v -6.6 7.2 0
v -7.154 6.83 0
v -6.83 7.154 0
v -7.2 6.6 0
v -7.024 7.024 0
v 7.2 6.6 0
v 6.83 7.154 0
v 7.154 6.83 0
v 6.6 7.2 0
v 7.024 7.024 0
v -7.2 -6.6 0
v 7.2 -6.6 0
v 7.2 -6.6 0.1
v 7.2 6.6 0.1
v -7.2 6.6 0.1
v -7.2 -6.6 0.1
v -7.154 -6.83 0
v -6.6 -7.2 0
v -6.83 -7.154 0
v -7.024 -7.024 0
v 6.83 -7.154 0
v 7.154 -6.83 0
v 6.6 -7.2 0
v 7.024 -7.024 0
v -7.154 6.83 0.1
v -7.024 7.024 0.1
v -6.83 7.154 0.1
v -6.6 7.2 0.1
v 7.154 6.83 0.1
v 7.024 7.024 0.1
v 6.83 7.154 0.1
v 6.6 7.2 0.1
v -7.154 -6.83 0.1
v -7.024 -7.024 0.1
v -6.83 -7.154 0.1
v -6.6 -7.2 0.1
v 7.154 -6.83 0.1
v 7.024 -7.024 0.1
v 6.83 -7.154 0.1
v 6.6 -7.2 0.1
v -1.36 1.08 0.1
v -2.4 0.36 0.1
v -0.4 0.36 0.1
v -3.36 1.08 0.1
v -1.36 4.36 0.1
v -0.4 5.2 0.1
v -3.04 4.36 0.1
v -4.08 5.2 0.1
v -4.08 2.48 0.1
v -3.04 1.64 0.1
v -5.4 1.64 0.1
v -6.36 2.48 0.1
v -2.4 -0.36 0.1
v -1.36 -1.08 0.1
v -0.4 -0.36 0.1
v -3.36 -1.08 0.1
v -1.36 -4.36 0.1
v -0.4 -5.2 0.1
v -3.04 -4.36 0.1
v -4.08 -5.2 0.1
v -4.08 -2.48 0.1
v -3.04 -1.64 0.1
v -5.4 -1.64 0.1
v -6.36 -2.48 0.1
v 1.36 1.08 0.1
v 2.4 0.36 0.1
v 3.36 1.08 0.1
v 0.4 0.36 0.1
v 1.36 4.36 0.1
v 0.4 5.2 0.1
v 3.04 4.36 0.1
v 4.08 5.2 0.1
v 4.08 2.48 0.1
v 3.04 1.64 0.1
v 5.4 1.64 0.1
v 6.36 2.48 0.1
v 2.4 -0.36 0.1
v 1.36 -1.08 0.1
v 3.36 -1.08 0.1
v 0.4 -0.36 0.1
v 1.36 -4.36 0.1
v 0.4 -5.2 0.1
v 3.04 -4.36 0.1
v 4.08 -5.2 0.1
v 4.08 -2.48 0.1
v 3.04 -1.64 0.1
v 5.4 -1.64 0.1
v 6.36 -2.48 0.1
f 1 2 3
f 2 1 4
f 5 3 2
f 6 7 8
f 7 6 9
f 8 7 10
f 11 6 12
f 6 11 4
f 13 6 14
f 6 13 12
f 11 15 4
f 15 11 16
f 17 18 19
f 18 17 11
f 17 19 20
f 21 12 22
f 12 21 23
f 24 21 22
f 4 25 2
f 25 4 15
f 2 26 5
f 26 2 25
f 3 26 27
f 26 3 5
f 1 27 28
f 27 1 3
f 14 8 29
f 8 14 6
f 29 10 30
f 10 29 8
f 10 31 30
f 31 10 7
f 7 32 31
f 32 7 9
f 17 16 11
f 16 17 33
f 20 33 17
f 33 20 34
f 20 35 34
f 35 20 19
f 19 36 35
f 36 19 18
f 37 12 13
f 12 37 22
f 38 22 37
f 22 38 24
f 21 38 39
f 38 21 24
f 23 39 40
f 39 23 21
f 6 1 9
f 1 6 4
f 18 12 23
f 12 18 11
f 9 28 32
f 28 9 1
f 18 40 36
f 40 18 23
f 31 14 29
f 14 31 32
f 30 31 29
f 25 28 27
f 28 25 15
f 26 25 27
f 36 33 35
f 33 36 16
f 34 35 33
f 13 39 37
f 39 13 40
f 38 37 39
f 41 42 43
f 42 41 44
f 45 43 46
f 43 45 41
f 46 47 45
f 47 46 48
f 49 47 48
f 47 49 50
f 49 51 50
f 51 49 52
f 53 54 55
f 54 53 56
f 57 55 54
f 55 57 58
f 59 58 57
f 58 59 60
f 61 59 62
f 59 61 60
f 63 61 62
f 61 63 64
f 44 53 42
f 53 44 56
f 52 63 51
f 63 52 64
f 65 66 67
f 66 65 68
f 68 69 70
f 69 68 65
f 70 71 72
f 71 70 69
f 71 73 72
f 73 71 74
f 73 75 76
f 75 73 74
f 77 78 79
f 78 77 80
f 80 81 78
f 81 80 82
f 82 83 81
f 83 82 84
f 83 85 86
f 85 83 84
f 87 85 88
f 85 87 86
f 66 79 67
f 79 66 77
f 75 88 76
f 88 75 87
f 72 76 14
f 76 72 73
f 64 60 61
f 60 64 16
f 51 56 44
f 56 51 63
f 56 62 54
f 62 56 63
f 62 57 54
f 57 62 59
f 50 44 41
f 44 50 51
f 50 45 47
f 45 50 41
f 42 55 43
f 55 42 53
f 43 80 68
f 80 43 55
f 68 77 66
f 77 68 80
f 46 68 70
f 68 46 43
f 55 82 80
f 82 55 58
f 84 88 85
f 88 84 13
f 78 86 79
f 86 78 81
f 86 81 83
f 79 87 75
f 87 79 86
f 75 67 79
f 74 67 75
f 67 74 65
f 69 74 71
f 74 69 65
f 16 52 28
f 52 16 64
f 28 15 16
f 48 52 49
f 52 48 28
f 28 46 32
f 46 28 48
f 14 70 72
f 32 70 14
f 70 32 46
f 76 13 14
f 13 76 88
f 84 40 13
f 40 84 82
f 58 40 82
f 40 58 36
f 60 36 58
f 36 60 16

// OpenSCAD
// file: ../p/box3u12.scad
use <../lib.scad>
function ldraw_lib__box3u12() = [
// 0 Box with 3 Parallel Faces without Any Edges
// 0 Name: box3u12.dat
// 0 Author: J.C. Tchang [tchang]
// 0 !LDRAW_ORG Primitive UPDATE 2014-02
// 0 !LICENSE Licensed under CC BY 4.0 : see CAreadme.txt
// 
// 0 BFC CERTIFY CCW
  [0,"BFC","CERTIFY"],
  [0,"BFC","CCW"],
// 
// 0 !HISTORY 2014-12-23 [PTadmin] Official Update 2014-02
// 
// 
// 4 16 -1 1 1 1 1 1 1 1 -1 -1 1 -1
  [4,16,-1,1,1,1,1,1,1,1,-1,-1,1,-1],
// 4 16 -1 1 1 -1 0 1 1 0 1 1 1 1
  [4,16,-1,1,1,-1,0,1,1,0,1,1,1,1],
// 4 16 1 1 -1 1 0 -1 -1 0 -1 -1 1 -1
  [4,16,1,1,-1,1,0,-1,-1,0,-1,-1,1,-1],
];
module ldraw_lib__box3u12(step=0, col=false, unit=2/5, alt=false, line=0.2, solid=!$preview)
    makepoly(ldraw_lib__box3u12(), step=step, col=col, unit=unit, alt=alt, line=line, solid=solid);
ldraw_lib__box3u12(line=0.2);
// file: ../p/1-4cyli.scad
use <../lib.scad>
function ldraw_lib__1_4cyli() = [
// 0 Cylinder 0.25
// 0 Name: 1-4cyli.dat
// 0 Author: James Jessiman
// 0 !LDRAW_ORG Primitive UPDATE 2012-01
// 0 !LICENSE Licensed under CC BY 4.0 : see CAreadme.txt
// 
// 0 BFC CERTIFY CCW
  [0,"BFC","CERTIFY"],
  [0,"BFC","CCW"],
// 
// 0 !HISTORY 2002-03-23 [sbliss] Added BFC statement.
// 0 !HISTORY 2002-04-25 [PTadmin] Official Update 2002-02
// 0 !HISTORY 2007-06-22 [PTadmin] Header formatted for Contributor Agreement
// 0 !HISTORY 2008-07-01 [PTadmin] Official Update 2008-01
// 0 !HISTORY 2012-02-16 [Philo] Changed to CCW
// 0 !HISTORY 2012-03-30 [PTadmin] Official Update 2012-01
// 
// 
// 4 16 1 1 0 0.9239 1 0.3827 0.9239 0 0.3827 1 0 0
  [4,16,1,1,0,0.9239,1,0.3827,0.9239,0,0.3827,1,0,0],
// 5 24 1 0 0 1 1 0 0.9239 0 0.3827 1 0 -1
  [5,24,1,0,0,1,1,0,0.9239,0,0.3827,1,0,-1],
// 4 16 0.9239 1 0.3827 0.7071 1 0.7071 0.7071 0 0.7071 0.9239 0 0.3827
  [4,16,0.9239,1,0.3827,0.7071,1,0.7071,0.7071,0,0.7071,0.9239,0,0.3827],
// 5 24 0.9239 0 0.3827 0.9239 1 0.3827 0.7071 0 0.7071 1 0 0
  [5,24,0.9239,0,0.3827,0.9239,1,0.3827,0.7071,0,0.7071,1,0,0],
// 4 16 0.7071 1 0.7071 0.3827 1 0.9239 0.3827 0 0.9239 0.7071 0 0.7071
  [4,16,0.7071,1,0.7071,0.3827,1,0.9239,0.3827,0,0.9239,0.7071,0,0.7071],
// 5 24 0.7071 0 0.7071 0.7071 1 0.7071 0.3827 0 0.9239 0.9239 0 0.3827
  [5,24,0.7071,0,0.7071,0.7071,1,0.7071,0.3827,0,0.9239,0.9239,0,0.3827],
// 4 16 0.3827 1 0.9239 0 1 1 0 0 1 0.3827 0 0.9239
  [4,16,0.3827,1,0.9239,0,1,1,0,0,1,0.3827,0,0.9239],
// 5 24 0.3827 0 0.9239 0.3827 1 0.9239 0 0 1 0.7071 0 0.7071
  [5,24,0.3827,0,0.9239,0.3827,1,0.9239,0,0,1,0.7071,0,0.7071],
// 5 24 0 0 1 0 1 1 0.3827 0 0.9239 -1 0 1
  [5,24,0,0,1,0,1,1,0.3827,0,0.9239,-1,0,1],
];
module ldraw_lib__1_4cyli(step=0, col=false, unit=2/5, alt=false, line=0.2, solid=!$preview)
    makepoly(ldraw_lib__1_4cyli(), step=step, col=col, unit=unit, alt=alt, line=line, solid=solid);
ldraw_lib__1_4cyli(line=0.2);
// file: s/stickerback018x018.scad
use <../../lib.scad>
use <../../p/1-4chrd.scad>
use <../../p/1-4cyli.scad>
use <../../p/box3u12.scad>
function ldraw_lib__s__stickerback018x018() = [
// 0 ~Sticker Back  1.8 x  1.8
// 0 Name: s\stickerback018x018.dat
// 0 Author: Massimo Maso [Sirio]
// 0 !LDRAW_ORG Subpart UPDATE 2025-08
// 0 !LICENSE Licensed under CC BY 4.0 : see CAreadme.txt
// 
// 0 BFC CERTIFY CCW
  [0,"BFC","CERTIFY"],
  [0,"BFC","CCW"],
// 
// 0 !HISTORY 2025-08-31 [OrionP] Official Update 2025-08
// 
// 0 // Primitives
// 1 16 -16.5 0 16.5 -1.5 0 0 0 -1 0 0 0 1.5 1-4chrd.dat
  [1,16,-16.5,0,16.5,-1.5,0,0,0,-1,0,0,0,1.5, ldraw_lib__1_4chrd()],
// 1 16 16.5 0 16.5 1.5 0 0 0 -1 0 0 0 1.5 1-4chrd.dat
  [1,16,16.5,0,16.5,1.5,0,0,0,-1,0,0,0,1.5, ldraw_lib__1_4chrd()],
// 1 16 0 -.25 0 0 0 18 0 .25 0 16.5 0 0 box3u12.dat
  [1,16,0,-.25,0,0,0,18,0,.25,0,16.5,0,0, ldraw_lib__box3u12()],
// 1 16 -16.5 0 -16.5 -1.5 0 0 0 -1 0 0 0 -1.5 1-4chrd.dat
  [1,16,-16.5,0,-16.5,-1.5,0,0,0,-1,0,0,0,-1.5, ldraw_lib__1_4chrd()],
// 1 16 16.5 0 -16.5 1.5 0 0 0 -1 0 0 0 -1.5 1-4chrd.dat
  [1,16,16.5,0,-16.5,1.5,0,0,0,-1,0,0,0,-1.5, ldraw_lib__1_4chrd()],
// 1 16 -16.5 -.25 16.5 -1.5 0 0 0 .25 0 0 0 1.5 1-4cyli.dat
  [1,16,-16.5,-.25,16.5,-1.5,0,0,0,.25,0,0,0,1.5, ldraw_lib__1_4cyli()],
// 1 16 16.5 -.25 16.5 1.5 0 0 0 .25 0 0 0 1.5 1-4cyli.dat
  [1,16,16.5,-.25,16.5,1.5,0,0,0,.25,0,0,0,1.5, ldraw_lib__1_4cyli()],
// 1 16 -16.5 -.25 -16.5 -1.5 0 0 0 .25 0 0 0 -1.5 1-4cyli.dat
  [1,16,-16.5,-.25,-16.5,-1.5,0,0,0,.25,0,0,0,-1.5, ldraw_lib__1_4cyli()],
// 1 16 16.5 -.25 -16.5 1.5 0 0 0 .25 0 0 0 -1.5 1-4cyli.dat
  [1,16,16.5,-.25,-16.5,1.5,0,0,0,.25,0,0,0,-1.5, ldraw_lib__1_4cyli()],
// 0 // Bottom face
// 4 16 -16.5 0 18 16.5 0 18 18 0 16.5 -18 0 16.5
  [4,16,-16.5,0,18,16.5,0,18,18,0,16.5,-18,0,16.5],
// 4 16 -16.5 0 -18 -18 0 -16.5 18 0 -16.5 16.5 0 -18
  [4,16,-16.5,0,-18,-18,0,-16.5,18,0,-16.5,16.5,0,-18],
// 0 // Lateral face
// 4 16 -16.5 -.25 18 16.5 -.25 18 16.5 0 18 -16.5 0 18
  [4,16,-16.5,-.25,18,16.5,-.25,18,16.5,0,18,-16.5,0,18],
// 4 16 16.5 0 -18 16.5 -.25 -18 -16.5 -.25 -18 -16.5 0 -18
  [4,16,16.5,0,-18,16.5,-.25,-18,-16.5,-.25,-18,-16.5,0,-18],
];
module ldraw_lib__s__stickerback018x018(step=0, col=false, unit=2/5, alt=false, line=0.2, solid=!$preview)
    makepoly(ldraw_lib__s__stickerback018x018(), step=step, col=col, unit=unit, alt=alt, line=line, solid=solid);
ldraw_lib__s__stickerback018x018(line=0.2);
// file: ../p/1-4chrd.scad
use <../lib.scad>
function ldraw_lib__1_4chrd() = [
// 0 Chord 0.25
// 0 Name: 1-4chrd.dat
// 0 Author: Max Martin Richter [MMR1988]
// 0 !LDRAW_ORG Primitive UPDATE 2023-05
// 0 !LICENSE Licensed under CC BY 4.0 : see CAreadme.txt
// 
// 0 BFC CERTIFY CCW
  [0,"BFC","CERTIFY"],
  [0,"BFC","CCW"],
// 
// 0 !HISTORY 2004-04-22 [PTadmin] Official Update 2004-02
// 0 !HISTORY 2007-10-09 [PTadmin] Header formatted for Contributor Agreement
// 0 !HISTORY 2008-07-01 [PTadmin] Official Update 2008-01
// 0 !HISTORY 2012-08-02 [MMR1988] Re-creation with PrimGen2 and Rectifier
// 0 !HISTORY 2012-08-09 [PTadmin] Official Update 2012-02
// 0 !HISTORY 2023-10-27 [OrionP] Change author to MMR1988 from hafhead
// 0 !HISTORY 2023-10-31 [OrionP] Official Update 2023-05
// 
// 4 16 0.9239 0 0.3827 0.3827 0 0.9239 0 0 1 1 0 0
  [4,16,0.9239,0,0.3827,0.3827,0,0.9239,0,0,1,1,0,0],
// 3 16 0.7071 0 0.7071 0.3827 0 0.9239 0.9239 0 0.3827
  [3,16,0.7071,0,0.7071,0.3827,0,0.9239,0.9239,0,0.3827],
];
module ldraw_lib__1_4chrd(step=0, col=false, unit=2/5, alt=false, line=0.2, solid=!$preview)
    makepoly(ldraw_lib__1_4chrd(), step=step, col=col, unit=unit, alt=alt, line=line, solid=solid);
ldraw_lib__1_4chrd(line=0.2);
// main file
use <../lib.scad>
use <../p/1-4chrd.scad>
use <s/stickerback018x018.scad>
function ldraw_lib__6186799b() = [
// 0 Sticker  1.8 x  1.8 with Reddish Brown Symmetric Symbols on White Background
// 0 Name: 6186799b.dat
// 0 Author: Evert-Jan Boer [ejboer]
// 0 !LDRAW_ORG Part UPDATE 2026-08
// 0 !LICENSE Licensed under CC BY 4.0 : see CAreadme.txt
// 
// 0 BFC CERTIFY CCW
  [0,"BFC","CERTIFY"],
  [0,"BFC","CCW"],
// 
// 0 !CATEGORY Sticker
// 0 !KEYWORDS BrickLink 70618stk01, Brickowl 869032, cross, Destiny's Bounty
// 0 !KEYWORDS Ninjago, Rebrickable 33400, Set 70618
// 
// 0 !HISTORY 2024-10-27 [OrionP] Official Update 2024-09
// 0 !HISTORY 2026-07-20 [ejboer] Added stickerback
// 0 !HISTORY 2026-08-31 [OrionP] Official Update 2026-08
// 
// 1 16 0 0 0 1 0 0 0 1 0 0 0 1 s\stickerback018x018.dat
  [1,16,0,0,0,1,0,0,0,1,0,0,0,1, ldraw_lib__s__stickerback018x018()],
// 1 15 16.5 -.25 16.5 1.5 0 0 0 1 0 0 0 1.5 1-4chrd.dat
  [1,15,16.5,-.25,16.5,1.5,0,0,0,1,0,0,0,1.5, ldraw_lib__1_4chrd()],
// 1 15 -16.5 -.25 16.5 0 0 -1.5 0 1 0 1.5 0 0 1-4chrd.dat
  [1,15,-16.5,-.25,16.5,0,0,-1.5,0,1,0,1.5,0,0, ldraw_lib__1_4chrd()],
// 1 15 -16.5 -.25 -16.5 -1.5 0 0 0 1 0 0 0 -1.5 1-4chrd.dat
  [1,15,-16.5,-.25,-16.5,-1.5,0,0,0,1,0,0,0,-1.5, ldraw_lib__1_4chrd()],
// 1 15 16.5 -.25 -16.5 0 0 1.5 0 1 0 -1.5 0 0 1-4chrd.dat
  [1,15,16.5,-.25,-16.5,0,0,1.5,0,1,0,-1.5,0,0, ldraw_lib__1_4chrd()],
// 4 70 -6 -.25 .9 -1 -.25 .9 -3.4 -.25 2.7 -8.4 -.25 2.7
  [4,70,-6,-.25,.9,-1,-.25,.9,-3.4,-.25,2.7,-8.4,-.25,2.7],
// 4 70 -3.4 -.25 2.7 -1 -.25 .9 -1 -.25 13 -3.4 -.25 10.9
  [4,70,-3.4,-.25,2.7,-1,-.25,.9,-1,-.25,13,-3.4,-.25,10.9],
// 4 70 -3.4 -.25 10.9 -1 -.25 13 -10.2 -.25 13 -7.6 -.25 10.9
  [4,70,-3.4,-.25,10.9,-1,-.25,13,-10.2,-.25,13,-7.6,-.25,10.9],
// 4 70 -10.2 -.25 6.2 -7.6 -.25 4.1 -7.6 -.25 10.9 -10.2 -.25 13
  [4,70,-10.2,-.25,6.2,-7.6,-.25,4.1,-7.6,-.25,10.9,-10.2,-.25,13],
// 4 70 -13.5 -.25 4.1 -7.6 -.25 4.1 -10.2 -.25 6.2 -15.9 -.25 6.2
  [4,70,-13.5,-.25,4.1,-7.6,-.25,4.1,-10.2,-.25,6.2,-15.9,-.25,6.2],
// 4 70 -3.4 -.25 -2.7 -1 -.25 -.9 -6 -.25 -.9 -8.4 -.25 -2.7
  [4,70,-3.4,-.25,-2.7,-1,-.25,-.9,-6,-.25,-.9,-8.4,-.25,-2.7],
// 4 70 -1 -.25 -13 -1 -.25 -.9 -3.4 -.25 -2.7 -3.4 -.25 -10.9
  [4,70,-1,-.25,-13,-1,-.25,-.9,-3.4,-.25,-2.7,-3.4,-.25,-10.9],
// 4 70 -10.2 -.25 -13 -1 -.25 -13 -3.4 -.25 -10.9 -7.6 -.25 -10.9
  [4,70,-10.2,-.25,-13,-1,-.25,-13,-3.4,-.25,-10.9,-7.6,-.25,-10.9],
// 4 70 -7.6 -.25 -10.9 -7.6 -.25 -4.1 -10.2 -.25 -6.2 -10.2 -.25 -13
  [4,70,-7.6,-.25,-10.9,-7.6,-.25,-4.1,-10.2,-.25,-6.2,-10.2,-.25,-13],
// 4 70 -10.2 -.25 -6.2 -7.6 -.25 -4.1 -13.5 -.25 -4.1 -15.9 -.25 -6.2
  [4,70,-10.2,-.25,-6.2,-7.6,-.25,-4.1,-13.5,-.25,-4.1,-15.9,-.25,-6.2],
// 4 70 -6 -.25 -.9 -6 -.25 .9 -8.4 -.25 2.7 -8.4 -.25 -2.7
  [4,70,-6,-.25,-.9,-6,-.25,.9,-8.4,-.25,2.7,-8.4,-.25,-2.7],
// 4 70 -15.9 -.25 6.2 -15.9 -.25 -6.2 -13.5 -.25 -4.1 -13.5 -.25 4.1
  [4,70,-15.9,-.25,6.2,-15.9,-.25,-6.2,-13.5,-.25,-4.1,-13.5,-.25,4.1],
// 4 70 6 -.25 .9 8.4 -.25 2.7 3.4 -.25 2.7 1 -.25 .9
  [4,70,6,-.25,.9,8.4,-.25,2.7,3.4,-.25,2.7,1,-.25,.9],
// 4 70 3.4 -.25 2.7 3.4 -.25 10.9 1 -.25 13 1 -.25 .9
  [4,70,3.4,-.25,2.7,3.4,-.25,10.9,1,-.25,13,1,-.25,.9],
// 4 70 3.4 -.25 10.9 7.6 -.25 10.9 10.2 -.25 13 1 -.25 13
  [4,70,3.4,-.25,10.9,7.6,-.25,10.9,10.2,-.25,13,1,-.25,13],
// 4 70 10.2 -.25 6.2 10.2 -.25 13 7.6 -.25 10.9 7.6 -.25 4.1
  [4,70,10.2,-.25,6.2,10.2,-.25,13,7.6,-.25,10.9,7.6,-.25,4.1],
// 4 70 13.5 -.25 4.1 15.9 -.25 6.2 10.2 -.25 6.2 7.6 -.25 4.1
  [4,70,13.5,-.25,4.1,15.9,-.25,6.2,10.2,-.25,6.2,7.6,-.25,4.1],
// 4 70 3.4 -.25 -2.7 8.4 -.25 -2.7 6 -.25 -.9 1 -.25 -.9
  [4,70,3.4,-.25,-2.7,8.4,-.25,-2.7,6,-.25,-.9,1,-.25,-.9],
// 4 70 3.4 -.25 -2.7 1 -.25 -.9 1 -.25 -13 3.4 -.25 -10.9
  [4,70,3.4,-.25,-2.7,1,-.25,-.9,1,-.25,-13,3.4,-.25,-10.9],
// 4 70 10.2 -.25 -13 7.6 -.25 -10.9 3.4 -.25 -10.9 1 -.25 -13
  [4,70,10.2,-.25,-13,7.6,-.25,-10.9,3.4,-.25,-10.9,1,-.25,-13],
// 4 70 10.2 -.25 -6.2 7.6 -.25 -4.1 7.6 -.25 -10.9 10.2 -.25 -13
  [4,70,10.2,-.25,-6.2,7.6,-.25,-4.1,7.6,-.25,-10.9,10.2,-.25,-13],
// 4 70 10.2 -.25 -6.2 15.9 -.25 -6.2 13.5 -.25 -4.1 7.6 -.25 -4.1
  [4,70,10.2,-.25,-6.2,15.9,-.25,-6.2,13.5,-.25,-4.1,7.6,-.25,-4.1],
// 4 70 6 -.25 -.9 8.4 -.25 -2.7 8.4 -.25 2.7 6 -.25 .9
  [4,70,6,-.25,-.9,8.4,-.25,-2.7,8.4,-.25,2.7,6,-.25,.9],
// 4 70 13.5 -.25 -4.1 15.9 -.25 -6.2 15.9 -.25 6.2 13.5 -.25 4.1
  [4,70,13.5,-.25,-4.1,15.9,-.25,-6.2,15.9,-.25,6.2,13.5,-.25,4.1],
// 4 15 10.2 -.25 13 10.2 -.25 6.2 15.9 -.25 6.2 18 -.25 16.5
  [4,15,10.2,-.25,13,10.2,-.25,6.2,15.9,-.25,6.2,18,-.25,16.5],
// 4 15 -10.2 -.25 -13 -10.2 -.25 -6.2 -15.9 -.25 -6.2 -18 -.25 -16.5
  [4,15,-10.2,-.25,-13,-10.2,-.25,-6.2,-15.9,-.25,-6.2,-18,-.25,-16.5],
// 4 15 -8.4 -.25 -2.7 -8.4 -.25 2.7 -13.5 -.25 4.1 -13.5 -.25 -4.1
  [4,15,-8.4,-.25,-2.7,-8.4,-.25,2.7,-13.5,-.25,4.1,-13.5,-.25,-4.1],
// 4 15 -7.6 -.25 -4.1 -3.4 -.25 -2.7 -8.4 -.25 -2.7 -13.5 -.25 -4.1
  [4,15,-7.6,-.25,-4.1,-3.4,-.25,-2.7,-8.4,-.25,-2.7,-13.5,-.25,-4.1],
// 4 15 -7.6 -.25 -10.9 -3.4 -.25 -10.9 -3.4 -.25 -2.7 -7.6 -.25 -4.1
  [4,15,-7.6,-.25,-10.9,-3.4,-.25,-10.9,-3.4,-.25,-2.7,-7.6,-.25,-4.1],
// 4 15 -8.4 -.25 2.7 -3.4 -.25 2.7 -7.6 -.25 4.1 -13.5 -.25 4.1
  [4,15,-8.4,-.25,2.7,-3.4,-.25,2.7,-7.6,-.25,4.1,-13.5,-.25,4.1],
// 4 15 -3.4 -.25 2.7 -3.4 -.25 10.9 -7.6 -.25 10.9 -7.6 -.25 4.1
  [4,15,-3.4,-.25,2.7,-3.4,-.25,10.9,-7.6,-.25,10.9,-7.6,-.25,4.1],
// 4 15 -1 -.25 .9 -6 -.25 .9 -6 -.25 -.9 -1 -.25 -.9
  [4,15,-1,-.25,.9,-6,-.25,.9,-6,-.25,-.9,-1,-.25,-.9],
// 4 15 -1 -.25 -.9 1 -.25 -.9 1 -.25 .9 -1 -.25 .9
  [4,15,-1,-.25,-.9,1,-.25,-.9,1,-.25,.9,-1,-.25,.9],
// 4 15 1 -.25 -.9 6 -.25 -.9 6 -.25 .9 1 -.25 .9
  [4,15,1,-.25,-.9,6,-.25,-.9,6,-.25,.9,1,-.25,.9],
// 4 15 -1 -.25 .9 1 -.25 .9 1 -.25 13 -1 -.25 13
  [4,15,-1,-.25,.9,1,-.25,.9,1,-.25,13,-1,-.25,13],
// 4 15 -1 -.25 -13 1 -.25 -13 1 -.25 -.9 -1 -.25 -.9
  [4,15,-1,-.25,-13,1,-.25,-13,1,-.25,-.9,-1,-.25,-.9],
// 4 15 10.2 -.25 -13 18 -.25 -16.5 15.9 -.25 -6.2 10.2 -.25 -6.2
  [4,15,10.2,-.25,-13,18,-.25,-16.5,15.9,-.25,-6.2,10.2,-.25,-6.2],
// 4 15 7.6 -.25 -4.1 8.4 -.25 -2.7 3.4 -.25 -2.7 3.4 -.25 -10.9
  [4,15,7.6,-.25,-4.1,8.4,-.25,-2.7,3.4,-.25,-2.7,3.4,-.25,-10.9],
// 3 15 7.6 -.25 -4.1 3.4 -.25 -10.9 7.6 -.25 -10.9
  [3,15,7.6,-.25,-4.1,3.4,-.25,-10.9,7.6,-.25,-10.9],
// 4 15 13.5 -.25 -4.1 13.5 -.25 4.1 8.4 -.25 -2.7 7.6 -.25 -4.1
  [4,15,13.5,-.25,-4.1,13.5,-.25,4.1,8.4,-.25,-2.7,7.6,-.25,-4.1],
// 3 15 13.5 -.25 4.1 8.4 -.25 2.7 8.4 -.25 -2.7
  [3,15,13.5,-.25,4.1,8.4,-.25,2.7,8.4,-.25,-2.7],
// 4 15 7.6 -.25 4.1 3.4 -.25 2.7 8.4 -.25 2.7 13.5 -.25 4.1
  [4,15,7.6,-.25,4.1,3.4,-.25,2.7,8.4,-.25,2.7,13.5,-.25,4.1],
// 4 15 7.6 -.25 4.1 7.6 -.25 10.9 3.4 -.25 10.9 3.4 -.25 2.7
  [4,15,7.6,-.25,4.1,7.6,-.25,10.9,3.4,-.25,10.9,3.4,-.25,2.7],
// 4 15 -15.9 -.25 -6.2 -15.9 -.25 6.2 -16.5 -.25 18 -18 -.25 -16.5
  [4,15,-15.9,-.25,-6.2,-15.9,-.25,6.2,-16.5,-.25,18,-18,-.25,-16.5],
// 3 15 -16.5 -.25 18 -18 -.25 16.5 -18 -.25 -16.5
  [3,15,-16.5,-.25,18,-18,-.25,16.5,-18,-.25,-16.5],
// 4 15 -10.2 -.25 13 -16.5 -.25 18 -15.9 -.25 6.2 -10.2 -.25 6.2
  [4,15,-10.2,-.25,13,-16.5,-.25,18,-15.9,-.25,6.2,-10.2,-.25,6.2],
// 4 15 16.5 -.25 18 -16.5 -.25 18 -10.2 -.25 13 -1 -.25 13
  [4,15,16.5,-.25,18,-16.5,-.25,18,-10.2,-.25,13,-1,-.25,13],
// 3 15 18 -.25 16.5 1 -.25 13 10.2 -.25 13
  [3,15,18,-.25,16.5,1,-.25,13,10.2,-.25,13],
// 4 15 -1 -.25 13 1 -.25 13 18 -.25 16.5 16.5 -.25 18
  [4,15,-1,-.25,13,1,-.25,13,18,-.25,16.5,16.5,-.25,18],
// 4 15 15.9 -.25 -6.2 18 -.25 -16.5 18 -.25 16.5 15.9 -.25 6.2
  [4,15,15.9,-.25,-6.2,18,-.25,-16.5,18,-.25,16.5,15.9,-.25,6.2],
// 4 15 16.5 -.25 -18 18 -.25 -16.5 10.2 -.25 -13 1 -.25 -13
  [4,15,16.5,-.25,-18,18,-.25,-16.5,10.2,-.25,-13,1,-.25,-13],
// 4 15 16.5 -.25 -18 1 -.25 -13 -1 -.25 -13 -16.5 -.25 -18
  [4,15,16.5,-.25,-18,1,-.25,-13,-1,-.25,-13,-16.5,-.25,-18],
// 4 15 -16.5 -.25 -18 -1 -.25 -13 -10.2 -.25 -13 -18 -.25 -16.5
  [4,15,-16.5,-.25,-18,-1,-.25,-13,-10.2,-.25,-13,-18,-.25,-16.5],
];
module ldraw_lib__6186799b(step=0, col=false, unit=2/5, alt=false, line=0.2, solid=!$preview)
    makepoly(ldraw_lib__6186799b(), step=step, col=col, unit=unit, alt=alt, line=line, solid=solid);
ldraw_lib__6186799b(line=0.2);
